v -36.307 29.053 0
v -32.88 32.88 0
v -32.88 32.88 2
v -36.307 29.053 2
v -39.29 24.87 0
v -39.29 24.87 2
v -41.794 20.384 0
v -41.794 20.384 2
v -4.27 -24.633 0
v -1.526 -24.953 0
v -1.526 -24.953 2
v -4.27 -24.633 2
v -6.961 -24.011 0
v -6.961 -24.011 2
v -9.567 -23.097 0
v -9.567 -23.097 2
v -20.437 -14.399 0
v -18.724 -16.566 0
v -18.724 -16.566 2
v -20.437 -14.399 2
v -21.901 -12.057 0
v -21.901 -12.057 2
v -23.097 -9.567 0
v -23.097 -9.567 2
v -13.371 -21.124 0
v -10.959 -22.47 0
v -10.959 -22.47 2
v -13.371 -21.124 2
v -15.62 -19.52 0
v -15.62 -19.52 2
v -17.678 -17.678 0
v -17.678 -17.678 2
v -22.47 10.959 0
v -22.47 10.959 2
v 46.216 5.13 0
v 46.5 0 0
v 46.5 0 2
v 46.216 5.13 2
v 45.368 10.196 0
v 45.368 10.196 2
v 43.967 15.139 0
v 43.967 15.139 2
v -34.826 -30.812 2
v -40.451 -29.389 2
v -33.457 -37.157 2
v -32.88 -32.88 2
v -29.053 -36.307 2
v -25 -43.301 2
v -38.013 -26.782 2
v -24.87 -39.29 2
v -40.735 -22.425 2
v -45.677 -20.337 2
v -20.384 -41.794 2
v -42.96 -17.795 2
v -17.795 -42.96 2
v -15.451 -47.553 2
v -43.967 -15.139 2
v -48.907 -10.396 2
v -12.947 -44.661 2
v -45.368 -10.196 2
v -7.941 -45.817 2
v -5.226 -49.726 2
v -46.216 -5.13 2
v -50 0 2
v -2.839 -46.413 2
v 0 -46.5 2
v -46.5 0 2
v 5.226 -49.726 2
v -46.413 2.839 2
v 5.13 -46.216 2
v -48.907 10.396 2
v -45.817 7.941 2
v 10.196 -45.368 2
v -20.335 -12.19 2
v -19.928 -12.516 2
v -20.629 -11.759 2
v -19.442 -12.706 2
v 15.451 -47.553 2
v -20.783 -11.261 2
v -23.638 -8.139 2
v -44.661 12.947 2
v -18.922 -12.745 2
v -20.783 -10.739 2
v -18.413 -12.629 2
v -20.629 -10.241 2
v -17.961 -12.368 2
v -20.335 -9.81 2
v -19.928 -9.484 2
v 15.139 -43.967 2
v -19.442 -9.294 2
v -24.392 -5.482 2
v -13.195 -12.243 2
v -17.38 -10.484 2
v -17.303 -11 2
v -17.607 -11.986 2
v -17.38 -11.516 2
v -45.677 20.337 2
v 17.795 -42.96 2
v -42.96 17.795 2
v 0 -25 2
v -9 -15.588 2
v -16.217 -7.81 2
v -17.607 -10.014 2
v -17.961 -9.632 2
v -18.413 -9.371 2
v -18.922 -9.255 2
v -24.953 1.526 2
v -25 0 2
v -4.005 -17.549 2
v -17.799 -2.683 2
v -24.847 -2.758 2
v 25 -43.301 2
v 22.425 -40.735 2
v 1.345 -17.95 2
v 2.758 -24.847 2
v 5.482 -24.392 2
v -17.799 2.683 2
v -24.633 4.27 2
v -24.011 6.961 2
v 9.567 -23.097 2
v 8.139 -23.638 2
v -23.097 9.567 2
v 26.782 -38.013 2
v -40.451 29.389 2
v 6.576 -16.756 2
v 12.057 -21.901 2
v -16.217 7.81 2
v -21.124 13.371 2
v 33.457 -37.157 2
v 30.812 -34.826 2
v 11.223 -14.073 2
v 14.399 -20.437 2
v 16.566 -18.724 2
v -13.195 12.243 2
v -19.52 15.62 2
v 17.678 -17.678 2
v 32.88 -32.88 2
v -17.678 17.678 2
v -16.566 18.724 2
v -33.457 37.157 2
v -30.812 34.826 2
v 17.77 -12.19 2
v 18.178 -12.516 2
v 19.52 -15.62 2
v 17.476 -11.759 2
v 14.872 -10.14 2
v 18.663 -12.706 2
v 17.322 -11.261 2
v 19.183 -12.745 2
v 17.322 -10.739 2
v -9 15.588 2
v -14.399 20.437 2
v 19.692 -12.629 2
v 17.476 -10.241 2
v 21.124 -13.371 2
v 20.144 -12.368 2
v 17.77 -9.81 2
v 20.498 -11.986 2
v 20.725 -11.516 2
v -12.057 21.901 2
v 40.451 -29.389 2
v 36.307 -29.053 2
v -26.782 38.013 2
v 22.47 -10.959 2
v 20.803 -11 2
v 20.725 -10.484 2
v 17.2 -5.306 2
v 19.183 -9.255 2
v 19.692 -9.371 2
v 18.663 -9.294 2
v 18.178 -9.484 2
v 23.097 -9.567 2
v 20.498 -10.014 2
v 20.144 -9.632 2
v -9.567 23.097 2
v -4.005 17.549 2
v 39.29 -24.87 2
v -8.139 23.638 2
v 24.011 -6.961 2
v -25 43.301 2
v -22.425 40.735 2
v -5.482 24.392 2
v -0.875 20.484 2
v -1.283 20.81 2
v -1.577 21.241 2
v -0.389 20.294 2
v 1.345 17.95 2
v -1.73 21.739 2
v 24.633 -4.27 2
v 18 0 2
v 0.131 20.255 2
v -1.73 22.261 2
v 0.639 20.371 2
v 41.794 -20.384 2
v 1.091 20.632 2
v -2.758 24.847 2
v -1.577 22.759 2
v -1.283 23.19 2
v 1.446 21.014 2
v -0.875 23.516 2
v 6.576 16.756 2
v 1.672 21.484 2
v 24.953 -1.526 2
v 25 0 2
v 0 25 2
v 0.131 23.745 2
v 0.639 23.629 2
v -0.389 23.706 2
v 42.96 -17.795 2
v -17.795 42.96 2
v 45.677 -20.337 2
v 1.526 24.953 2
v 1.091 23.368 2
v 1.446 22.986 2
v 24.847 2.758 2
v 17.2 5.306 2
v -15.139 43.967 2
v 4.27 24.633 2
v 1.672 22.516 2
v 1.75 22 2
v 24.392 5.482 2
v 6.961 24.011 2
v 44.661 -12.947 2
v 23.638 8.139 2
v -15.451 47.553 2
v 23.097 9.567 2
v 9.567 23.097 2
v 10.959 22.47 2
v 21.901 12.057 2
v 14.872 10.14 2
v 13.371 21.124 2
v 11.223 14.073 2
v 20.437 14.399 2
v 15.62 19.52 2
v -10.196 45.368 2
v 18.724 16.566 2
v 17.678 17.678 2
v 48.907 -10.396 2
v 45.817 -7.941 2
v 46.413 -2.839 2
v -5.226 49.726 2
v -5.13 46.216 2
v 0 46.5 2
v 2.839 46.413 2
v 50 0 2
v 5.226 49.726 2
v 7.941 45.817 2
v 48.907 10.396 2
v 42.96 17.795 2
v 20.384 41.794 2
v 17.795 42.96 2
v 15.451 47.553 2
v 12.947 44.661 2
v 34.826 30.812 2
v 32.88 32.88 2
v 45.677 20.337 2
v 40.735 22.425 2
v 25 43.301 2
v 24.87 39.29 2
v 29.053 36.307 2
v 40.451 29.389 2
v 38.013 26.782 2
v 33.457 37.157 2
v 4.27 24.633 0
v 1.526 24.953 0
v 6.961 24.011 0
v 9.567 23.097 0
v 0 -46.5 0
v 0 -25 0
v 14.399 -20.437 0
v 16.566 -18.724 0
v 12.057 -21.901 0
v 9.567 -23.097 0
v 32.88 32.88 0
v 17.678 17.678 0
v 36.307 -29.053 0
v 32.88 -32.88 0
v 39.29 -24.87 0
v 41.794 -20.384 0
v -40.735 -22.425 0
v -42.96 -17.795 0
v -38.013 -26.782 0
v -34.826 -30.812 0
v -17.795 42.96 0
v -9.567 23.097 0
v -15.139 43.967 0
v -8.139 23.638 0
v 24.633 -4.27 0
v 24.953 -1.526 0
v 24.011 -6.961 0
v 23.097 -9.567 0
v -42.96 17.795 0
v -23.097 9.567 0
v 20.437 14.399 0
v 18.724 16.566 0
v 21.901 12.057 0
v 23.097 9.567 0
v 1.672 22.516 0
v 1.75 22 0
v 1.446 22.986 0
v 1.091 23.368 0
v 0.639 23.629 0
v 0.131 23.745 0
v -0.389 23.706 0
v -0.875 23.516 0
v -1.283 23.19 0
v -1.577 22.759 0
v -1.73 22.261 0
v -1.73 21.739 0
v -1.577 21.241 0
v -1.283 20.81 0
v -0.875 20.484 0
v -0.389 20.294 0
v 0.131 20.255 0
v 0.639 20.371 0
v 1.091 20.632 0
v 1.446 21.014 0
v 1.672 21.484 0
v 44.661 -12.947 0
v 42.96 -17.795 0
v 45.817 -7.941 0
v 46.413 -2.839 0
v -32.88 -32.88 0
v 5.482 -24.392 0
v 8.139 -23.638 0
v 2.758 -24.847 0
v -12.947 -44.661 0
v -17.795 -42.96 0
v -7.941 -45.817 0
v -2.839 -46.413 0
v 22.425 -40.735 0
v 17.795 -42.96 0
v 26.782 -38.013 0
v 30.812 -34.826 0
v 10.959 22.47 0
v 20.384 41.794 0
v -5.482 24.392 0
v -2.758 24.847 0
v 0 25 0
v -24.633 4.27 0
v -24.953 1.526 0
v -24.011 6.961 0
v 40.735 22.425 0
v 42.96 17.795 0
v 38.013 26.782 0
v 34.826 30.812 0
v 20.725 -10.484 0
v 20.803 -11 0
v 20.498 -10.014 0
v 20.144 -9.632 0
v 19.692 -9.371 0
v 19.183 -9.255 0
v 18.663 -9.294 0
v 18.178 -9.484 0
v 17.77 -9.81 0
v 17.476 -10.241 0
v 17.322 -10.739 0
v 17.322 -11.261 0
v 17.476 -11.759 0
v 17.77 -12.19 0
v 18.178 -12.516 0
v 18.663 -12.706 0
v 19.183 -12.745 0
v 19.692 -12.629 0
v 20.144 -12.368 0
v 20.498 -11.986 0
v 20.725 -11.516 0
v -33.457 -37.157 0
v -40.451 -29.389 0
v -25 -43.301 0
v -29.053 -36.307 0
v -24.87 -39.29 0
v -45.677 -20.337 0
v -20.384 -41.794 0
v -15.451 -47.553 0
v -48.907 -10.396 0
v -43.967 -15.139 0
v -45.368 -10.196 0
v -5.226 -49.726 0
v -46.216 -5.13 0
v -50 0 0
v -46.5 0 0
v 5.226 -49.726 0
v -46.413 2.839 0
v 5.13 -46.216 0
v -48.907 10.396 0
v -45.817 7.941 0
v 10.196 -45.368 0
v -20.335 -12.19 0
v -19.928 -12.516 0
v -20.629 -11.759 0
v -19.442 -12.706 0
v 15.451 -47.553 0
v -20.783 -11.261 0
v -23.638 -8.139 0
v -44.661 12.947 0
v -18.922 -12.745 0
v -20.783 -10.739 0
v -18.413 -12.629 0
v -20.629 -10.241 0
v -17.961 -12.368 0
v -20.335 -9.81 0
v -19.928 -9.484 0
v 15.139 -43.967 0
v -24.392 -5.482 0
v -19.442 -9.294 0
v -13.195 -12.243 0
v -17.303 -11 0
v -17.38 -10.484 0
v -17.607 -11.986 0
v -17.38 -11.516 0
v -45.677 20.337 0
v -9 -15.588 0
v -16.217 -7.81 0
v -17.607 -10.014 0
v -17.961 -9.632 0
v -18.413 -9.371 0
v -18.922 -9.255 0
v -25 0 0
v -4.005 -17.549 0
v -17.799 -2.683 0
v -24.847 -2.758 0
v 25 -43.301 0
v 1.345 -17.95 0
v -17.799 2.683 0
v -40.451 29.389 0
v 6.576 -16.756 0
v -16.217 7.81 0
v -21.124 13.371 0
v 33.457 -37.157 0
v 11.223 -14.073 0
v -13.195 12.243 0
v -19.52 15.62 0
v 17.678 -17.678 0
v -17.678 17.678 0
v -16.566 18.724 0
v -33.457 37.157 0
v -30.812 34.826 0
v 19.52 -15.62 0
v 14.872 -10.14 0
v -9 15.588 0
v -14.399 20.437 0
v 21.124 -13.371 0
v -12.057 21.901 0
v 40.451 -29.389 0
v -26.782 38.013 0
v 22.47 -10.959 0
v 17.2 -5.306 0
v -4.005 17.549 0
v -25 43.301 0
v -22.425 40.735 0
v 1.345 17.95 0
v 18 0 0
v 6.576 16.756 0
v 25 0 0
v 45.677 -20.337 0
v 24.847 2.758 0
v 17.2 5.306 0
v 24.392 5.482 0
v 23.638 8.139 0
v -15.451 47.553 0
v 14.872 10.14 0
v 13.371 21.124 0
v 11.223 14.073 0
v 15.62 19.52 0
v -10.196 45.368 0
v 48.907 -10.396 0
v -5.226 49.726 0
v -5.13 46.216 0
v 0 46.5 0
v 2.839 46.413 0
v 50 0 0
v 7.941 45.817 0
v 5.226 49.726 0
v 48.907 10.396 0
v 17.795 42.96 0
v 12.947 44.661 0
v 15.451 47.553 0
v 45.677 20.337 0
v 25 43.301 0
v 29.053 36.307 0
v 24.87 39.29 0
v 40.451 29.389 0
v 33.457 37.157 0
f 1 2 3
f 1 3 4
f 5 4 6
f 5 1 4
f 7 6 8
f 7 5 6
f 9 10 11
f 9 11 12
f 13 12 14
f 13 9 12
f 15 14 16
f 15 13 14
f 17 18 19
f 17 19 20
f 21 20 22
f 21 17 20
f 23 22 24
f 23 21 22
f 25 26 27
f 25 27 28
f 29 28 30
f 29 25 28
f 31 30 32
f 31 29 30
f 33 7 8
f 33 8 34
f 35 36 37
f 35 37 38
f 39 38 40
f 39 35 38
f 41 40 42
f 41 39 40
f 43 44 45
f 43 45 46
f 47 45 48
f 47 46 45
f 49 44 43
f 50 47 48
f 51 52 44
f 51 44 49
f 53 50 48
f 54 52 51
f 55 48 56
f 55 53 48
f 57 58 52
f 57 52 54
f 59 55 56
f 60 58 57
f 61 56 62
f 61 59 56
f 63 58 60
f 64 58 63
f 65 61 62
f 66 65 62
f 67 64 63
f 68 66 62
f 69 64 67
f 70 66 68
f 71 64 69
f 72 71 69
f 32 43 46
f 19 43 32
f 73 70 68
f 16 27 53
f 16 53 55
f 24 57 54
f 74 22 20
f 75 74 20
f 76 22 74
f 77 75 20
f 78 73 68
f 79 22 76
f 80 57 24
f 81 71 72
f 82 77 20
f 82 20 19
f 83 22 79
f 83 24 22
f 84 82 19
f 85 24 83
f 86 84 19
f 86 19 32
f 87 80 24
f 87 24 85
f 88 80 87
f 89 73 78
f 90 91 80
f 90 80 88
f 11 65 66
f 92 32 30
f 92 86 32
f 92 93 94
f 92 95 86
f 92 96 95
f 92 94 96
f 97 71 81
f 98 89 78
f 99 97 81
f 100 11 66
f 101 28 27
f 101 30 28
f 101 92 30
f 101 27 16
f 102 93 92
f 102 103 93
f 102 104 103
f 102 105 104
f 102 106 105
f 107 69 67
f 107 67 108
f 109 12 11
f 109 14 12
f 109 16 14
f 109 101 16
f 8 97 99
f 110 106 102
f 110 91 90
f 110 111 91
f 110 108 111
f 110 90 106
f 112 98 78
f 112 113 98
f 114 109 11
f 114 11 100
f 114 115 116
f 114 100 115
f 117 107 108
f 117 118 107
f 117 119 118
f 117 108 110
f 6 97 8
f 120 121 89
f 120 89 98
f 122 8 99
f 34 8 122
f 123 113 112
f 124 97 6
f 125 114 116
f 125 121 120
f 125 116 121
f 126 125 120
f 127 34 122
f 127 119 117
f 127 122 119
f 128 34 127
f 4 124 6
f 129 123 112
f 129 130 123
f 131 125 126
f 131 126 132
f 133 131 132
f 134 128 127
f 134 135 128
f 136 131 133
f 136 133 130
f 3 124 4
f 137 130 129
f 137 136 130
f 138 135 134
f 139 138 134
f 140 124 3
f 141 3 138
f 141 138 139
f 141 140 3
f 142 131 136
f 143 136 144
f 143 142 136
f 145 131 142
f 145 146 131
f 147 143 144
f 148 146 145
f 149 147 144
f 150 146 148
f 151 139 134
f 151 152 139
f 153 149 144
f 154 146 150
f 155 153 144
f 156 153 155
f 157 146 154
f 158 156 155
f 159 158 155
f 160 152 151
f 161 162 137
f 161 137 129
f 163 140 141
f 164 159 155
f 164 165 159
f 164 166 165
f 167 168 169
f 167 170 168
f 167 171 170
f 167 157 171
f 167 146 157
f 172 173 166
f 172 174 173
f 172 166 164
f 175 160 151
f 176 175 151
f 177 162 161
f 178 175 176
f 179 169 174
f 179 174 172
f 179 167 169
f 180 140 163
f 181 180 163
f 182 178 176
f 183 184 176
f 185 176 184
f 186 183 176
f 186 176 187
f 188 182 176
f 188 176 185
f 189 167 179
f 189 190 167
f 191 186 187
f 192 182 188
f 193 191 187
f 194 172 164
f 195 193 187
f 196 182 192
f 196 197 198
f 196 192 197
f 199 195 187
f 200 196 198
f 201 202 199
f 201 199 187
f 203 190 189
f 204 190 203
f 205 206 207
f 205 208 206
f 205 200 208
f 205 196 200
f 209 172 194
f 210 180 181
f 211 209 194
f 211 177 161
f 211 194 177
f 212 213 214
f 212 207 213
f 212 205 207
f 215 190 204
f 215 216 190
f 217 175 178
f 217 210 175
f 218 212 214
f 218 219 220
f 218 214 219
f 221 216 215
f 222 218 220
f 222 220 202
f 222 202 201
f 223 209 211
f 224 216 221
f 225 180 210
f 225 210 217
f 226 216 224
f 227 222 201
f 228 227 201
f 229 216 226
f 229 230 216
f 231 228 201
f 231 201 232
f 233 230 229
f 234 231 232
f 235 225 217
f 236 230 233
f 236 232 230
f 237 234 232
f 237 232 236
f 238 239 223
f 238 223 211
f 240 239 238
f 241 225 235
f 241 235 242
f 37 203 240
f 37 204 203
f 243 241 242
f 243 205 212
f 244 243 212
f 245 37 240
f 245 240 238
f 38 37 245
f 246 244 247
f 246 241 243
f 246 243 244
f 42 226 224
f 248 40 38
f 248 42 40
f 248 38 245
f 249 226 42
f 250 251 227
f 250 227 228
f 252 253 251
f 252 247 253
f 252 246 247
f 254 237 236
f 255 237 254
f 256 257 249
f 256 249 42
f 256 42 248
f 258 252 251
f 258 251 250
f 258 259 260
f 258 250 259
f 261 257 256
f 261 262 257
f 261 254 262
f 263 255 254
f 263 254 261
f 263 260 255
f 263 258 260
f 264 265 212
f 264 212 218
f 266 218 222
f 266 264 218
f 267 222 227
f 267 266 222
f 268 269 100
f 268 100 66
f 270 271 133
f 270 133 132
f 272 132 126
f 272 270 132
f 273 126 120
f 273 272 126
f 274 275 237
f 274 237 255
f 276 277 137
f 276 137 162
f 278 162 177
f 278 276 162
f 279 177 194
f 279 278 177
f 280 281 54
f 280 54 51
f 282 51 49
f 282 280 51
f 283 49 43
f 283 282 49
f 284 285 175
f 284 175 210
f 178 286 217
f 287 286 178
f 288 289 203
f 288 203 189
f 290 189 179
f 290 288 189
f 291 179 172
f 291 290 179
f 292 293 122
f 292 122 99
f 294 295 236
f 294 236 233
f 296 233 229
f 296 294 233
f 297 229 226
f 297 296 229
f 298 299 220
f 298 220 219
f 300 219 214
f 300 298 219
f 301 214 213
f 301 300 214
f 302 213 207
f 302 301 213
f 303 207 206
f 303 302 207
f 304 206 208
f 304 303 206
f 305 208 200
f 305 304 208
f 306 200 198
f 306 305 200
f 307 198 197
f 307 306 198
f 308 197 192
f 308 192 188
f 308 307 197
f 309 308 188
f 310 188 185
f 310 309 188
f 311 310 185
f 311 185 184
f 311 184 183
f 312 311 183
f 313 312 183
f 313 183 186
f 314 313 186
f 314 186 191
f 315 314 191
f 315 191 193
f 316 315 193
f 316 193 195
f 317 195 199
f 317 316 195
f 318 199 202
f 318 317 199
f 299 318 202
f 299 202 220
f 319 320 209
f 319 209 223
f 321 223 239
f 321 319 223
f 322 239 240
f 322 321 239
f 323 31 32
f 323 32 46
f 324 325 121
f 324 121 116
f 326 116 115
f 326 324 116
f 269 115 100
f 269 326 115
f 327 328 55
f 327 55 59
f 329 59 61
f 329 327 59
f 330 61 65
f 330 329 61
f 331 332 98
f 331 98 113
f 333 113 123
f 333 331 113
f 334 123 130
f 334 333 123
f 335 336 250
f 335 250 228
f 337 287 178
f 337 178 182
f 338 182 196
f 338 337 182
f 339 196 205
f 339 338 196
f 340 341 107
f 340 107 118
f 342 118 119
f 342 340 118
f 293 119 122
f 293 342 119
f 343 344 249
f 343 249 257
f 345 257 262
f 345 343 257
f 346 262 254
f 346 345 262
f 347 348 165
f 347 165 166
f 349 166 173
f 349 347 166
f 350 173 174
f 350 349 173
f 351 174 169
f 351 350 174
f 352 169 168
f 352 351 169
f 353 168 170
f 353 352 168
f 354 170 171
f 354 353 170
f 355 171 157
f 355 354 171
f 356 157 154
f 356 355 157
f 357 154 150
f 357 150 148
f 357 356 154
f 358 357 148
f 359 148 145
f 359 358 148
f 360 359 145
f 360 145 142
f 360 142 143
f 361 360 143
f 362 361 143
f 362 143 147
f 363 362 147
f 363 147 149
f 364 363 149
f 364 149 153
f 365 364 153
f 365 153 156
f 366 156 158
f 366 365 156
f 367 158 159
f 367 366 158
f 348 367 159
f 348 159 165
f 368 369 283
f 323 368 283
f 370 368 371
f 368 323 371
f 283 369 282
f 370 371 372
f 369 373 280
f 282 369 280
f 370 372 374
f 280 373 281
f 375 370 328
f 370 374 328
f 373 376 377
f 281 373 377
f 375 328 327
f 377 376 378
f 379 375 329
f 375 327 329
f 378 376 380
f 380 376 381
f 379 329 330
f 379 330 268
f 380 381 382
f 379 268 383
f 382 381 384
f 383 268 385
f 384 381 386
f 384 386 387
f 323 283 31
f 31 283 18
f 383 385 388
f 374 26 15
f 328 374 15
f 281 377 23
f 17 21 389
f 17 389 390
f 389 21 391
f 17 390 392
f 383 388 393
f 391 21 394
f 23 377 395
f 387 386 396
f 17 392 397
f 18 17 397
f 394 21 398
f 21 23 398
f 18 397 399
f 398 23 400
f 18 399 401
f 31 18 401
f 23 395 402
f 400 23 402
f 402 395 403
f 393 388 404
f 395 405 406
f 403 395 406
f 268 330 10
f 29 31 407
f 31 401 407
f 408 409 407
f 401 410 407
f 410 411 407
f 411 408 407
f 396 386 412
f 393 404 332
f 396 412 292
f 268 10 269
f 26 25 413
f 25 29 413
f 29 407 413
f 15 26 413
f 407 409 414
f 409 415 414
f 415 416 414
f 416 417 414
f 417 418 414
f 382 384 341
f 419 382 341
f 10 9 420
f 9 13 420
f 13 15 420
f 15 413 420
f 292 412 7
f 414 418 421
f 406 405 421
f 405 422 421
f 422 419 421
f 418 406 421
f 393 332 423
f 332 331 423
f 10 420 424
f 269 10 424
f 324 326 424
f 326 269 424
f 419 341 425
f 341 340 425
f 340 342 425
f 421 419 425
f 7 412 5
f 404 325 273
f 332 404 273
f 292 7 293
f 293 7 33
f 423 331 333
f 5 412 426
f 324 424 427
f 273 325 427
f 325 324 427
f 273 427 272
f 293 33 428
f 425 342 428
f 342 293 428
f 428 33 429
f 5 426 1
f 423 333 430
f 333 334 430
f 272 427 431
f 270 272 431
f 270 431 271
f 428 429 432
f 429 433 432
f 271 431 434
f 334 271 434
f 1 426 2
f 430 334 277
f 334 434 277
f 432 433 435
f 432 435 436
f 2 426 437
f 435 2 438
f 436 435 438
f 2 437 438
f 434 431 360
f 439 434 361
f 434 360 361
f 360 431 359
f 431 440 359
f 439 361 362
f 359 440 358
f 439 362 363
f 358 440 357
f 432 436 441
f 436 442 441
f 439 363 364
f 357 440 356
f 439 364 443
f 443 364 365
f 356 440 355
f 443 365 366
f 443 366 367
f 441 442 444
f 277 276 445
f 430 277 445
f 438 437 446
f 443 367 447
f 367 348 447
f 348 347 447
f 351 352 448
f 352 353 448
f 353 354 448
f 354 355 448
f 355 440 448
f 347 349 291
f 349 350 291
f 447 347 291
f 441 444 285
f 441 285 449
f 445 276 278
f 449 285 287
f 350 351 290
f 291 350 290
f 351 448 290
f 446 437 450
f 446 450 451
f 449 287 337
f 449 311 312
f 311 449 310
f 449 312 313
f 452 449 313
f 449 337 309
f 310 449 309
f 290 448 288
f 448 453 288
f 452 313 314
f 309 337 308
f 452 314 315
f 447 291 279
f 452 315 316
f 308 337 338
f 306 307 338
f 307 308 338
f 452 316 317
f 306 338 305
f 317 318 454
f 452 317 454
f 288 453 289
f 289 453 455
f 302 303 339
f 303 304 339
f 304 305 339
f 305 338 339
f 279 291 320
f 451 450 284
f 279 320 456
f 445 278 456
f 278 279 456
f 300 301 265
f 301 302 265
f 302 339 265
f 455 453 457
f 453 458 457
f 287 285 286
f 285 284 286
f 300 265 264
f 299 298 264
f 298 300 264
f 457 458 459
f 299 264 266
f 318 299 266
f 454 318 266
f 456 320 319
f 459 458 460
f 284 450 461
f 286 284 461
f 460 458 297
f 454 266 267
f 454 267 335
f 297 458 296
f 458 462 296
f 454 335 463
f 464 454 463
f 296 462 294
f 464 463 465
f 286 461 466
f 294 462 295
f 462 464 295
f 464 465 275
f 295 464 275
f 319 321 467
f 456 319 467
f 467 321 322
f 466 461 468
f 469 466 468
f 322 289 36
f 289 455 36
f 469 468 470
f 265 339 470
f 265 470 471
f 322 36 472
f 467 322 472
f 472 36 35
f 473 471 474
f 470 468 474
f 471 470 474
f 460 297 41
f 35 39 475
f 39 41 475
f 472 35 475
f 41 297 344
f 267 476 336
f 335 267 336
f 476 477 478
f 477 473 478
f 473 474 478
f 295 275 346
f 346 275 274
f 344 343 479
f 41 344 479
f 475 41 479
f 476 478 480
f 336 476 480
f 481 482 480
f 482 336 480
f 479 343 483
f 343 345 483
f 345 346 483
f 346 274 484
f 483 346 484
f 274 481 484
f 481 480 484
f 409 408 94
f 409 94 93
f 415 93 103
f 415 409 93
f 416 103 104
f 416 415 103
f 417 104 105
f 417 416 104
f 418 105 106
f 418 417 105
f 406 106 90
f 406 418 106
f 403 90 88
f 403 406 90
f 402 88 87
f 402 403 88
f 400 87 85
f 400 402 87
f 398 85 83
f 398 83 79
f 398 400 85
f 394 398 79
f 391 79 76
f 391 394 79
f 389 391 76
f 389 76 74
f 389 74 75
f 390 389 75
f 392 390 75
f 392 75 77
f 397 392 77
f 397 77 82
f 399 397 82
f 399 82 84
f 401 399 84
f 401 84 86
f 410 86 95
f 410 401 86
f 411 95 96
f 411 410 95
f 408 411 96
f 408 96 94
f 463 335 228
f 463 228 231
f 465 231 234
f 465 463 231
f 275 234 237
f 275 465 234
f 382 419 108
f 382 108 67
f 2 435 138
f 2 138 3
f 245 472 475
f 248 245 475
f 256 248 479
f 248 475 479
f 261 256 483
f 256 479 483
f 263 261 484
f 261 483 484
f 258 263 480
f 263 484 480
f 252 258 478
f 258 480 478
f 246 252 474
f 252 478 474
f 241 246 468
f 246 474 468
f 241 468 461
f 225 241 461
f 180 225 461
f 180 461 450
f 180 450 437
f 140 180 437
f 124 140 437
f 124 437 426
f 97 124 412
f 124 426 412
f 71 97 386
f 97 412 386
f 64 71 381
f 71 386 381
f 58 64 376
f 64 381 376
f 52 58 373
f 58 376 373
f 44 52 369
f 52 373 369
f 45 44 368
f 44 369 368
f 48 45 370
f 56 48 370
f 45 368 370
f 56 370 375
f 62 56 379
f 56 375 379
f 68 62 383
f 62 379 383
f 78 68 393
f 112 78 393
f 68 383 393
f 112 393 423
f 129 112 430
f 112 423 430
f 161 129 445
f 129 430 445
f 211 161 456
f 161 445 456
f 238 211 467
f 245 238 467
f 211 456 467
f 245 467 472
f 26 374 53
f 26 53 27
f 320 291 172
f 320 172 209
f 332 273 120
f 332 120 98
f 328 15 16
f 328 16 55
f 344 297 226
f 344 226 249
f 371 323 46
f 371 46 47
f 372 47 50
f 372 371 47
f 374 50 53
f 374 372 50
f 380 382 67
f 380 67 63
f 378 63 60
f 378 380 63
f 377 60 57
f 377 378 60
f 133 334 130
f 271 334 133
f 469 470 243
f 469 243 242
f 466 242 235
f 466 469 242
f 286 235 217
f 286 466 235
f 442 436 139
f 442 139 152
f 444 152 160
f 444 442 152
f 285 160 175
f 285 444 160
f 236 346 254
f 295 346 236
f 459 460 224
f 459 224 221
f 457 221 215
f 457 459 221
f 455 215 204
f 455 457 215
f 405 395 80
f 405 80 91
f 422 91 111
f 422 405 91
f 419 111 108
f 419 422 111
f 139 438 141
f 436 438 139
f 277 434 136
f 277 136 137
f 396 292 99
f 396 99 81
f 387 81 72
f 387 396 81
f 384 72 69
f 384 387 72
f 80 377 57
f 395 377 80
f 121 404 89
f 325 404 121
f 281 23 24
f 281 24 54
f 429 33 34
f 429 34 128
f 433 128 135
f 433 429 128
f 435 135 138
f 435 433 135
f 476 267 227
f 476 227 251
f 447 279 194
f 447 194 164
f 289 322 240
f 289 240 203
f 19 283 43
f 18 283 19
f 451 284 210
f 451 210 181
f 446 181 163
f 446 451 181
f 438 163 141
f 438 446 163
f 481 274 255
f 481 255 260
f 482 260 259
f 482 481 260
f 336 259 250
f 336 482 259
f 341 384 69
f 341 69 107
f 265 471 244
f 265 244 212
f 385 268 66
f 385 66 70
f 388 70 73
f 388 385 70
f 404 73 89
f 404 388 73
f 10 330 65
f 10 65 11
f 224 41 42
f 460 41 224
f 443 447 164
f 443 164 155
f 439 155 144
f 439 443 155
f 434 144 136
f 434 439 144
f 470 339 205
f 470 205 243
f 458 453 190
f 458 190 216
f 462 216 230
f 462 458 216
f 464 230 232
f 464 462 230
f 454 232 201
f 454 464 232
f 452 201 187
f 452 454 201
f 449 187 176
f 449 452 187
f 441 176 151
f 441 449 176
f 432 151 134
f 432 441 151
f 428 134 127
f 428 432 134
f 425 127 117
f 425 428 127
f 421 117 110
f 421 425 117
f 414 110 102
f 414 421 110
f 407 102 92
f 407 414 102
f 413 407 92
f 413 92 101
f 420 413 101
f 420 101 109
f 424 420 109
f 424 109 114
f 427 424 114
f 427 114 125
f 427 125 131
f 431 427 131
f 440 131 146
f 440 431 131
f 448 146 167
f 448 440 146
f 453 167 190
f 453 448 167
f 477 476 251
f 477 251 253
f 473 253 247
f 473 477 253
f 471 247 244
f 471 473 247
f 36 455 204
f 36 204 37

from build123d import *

# Parameters (mm, degrees)
SKETCH1_R           = 50
SKETCH1_R_2         = 18
SKETCH1_R_3         = 1.75
BOSS_EXTRUDE1_DEPTH = 2


with BuildPart() as part:
    # Sketch1 → Boss-Extrude1 (new body)
    with BuildSketch(Plane.XY):
        Circle(SKETCH1_R)
        Circle(SKETCH1_R_2, mode=Mode.SUBTRACT)
        with Locations((0, 22)):
            Circle(SKETCH1_R_3, mode=Mode.SUBTRACT)
        with Locations((19.052558883, -11)):
            Circle(SKETCH1_R_3, mode=Mode.SUBTRACT)
        with Locations((-19.052558883, -11)):
            Circle(SKETCH1_R_3, mode=Mode.SUBTRACT)
        with BuildLine():
            Line((25, 0), (46.5, 0))
            ThreePointArc((46.5, 0), (45.862280471, 7.674713673), (43.966613765, 15.138919182))
            Line((43.966613765, 15.138919182), (23.63796439, 8.139203861))
            ThreePointArc((23.63796439, 8.139203861), (24.657140038, 4.126190147), (25, 0))
        make_face(mode=Mode.SUBTRACT)
        with BuildLine():
            Line((23.096988313, -9.567085809), (42.960398262, -17.794779605))
            ThreePointArc((42.960398262, -17.794779605), (45.308208013, -10.460224027), (46.413268127, -2.838757088))
            Line((46.413268127, -2.838757088), (24.953369961, -1.526213488))
            ThreePointArc((24.953369961, -1.526213488), (24.35925162, -5.623776359), (23.096988313, -9.567085809))
        make_face(mode=Mode.SUBTRACT)
        with BuildLine():
            Line((17.67766953, -17.67766953), (32.880465325, -32.880465325))
            ThreePointArc((32.880465325, -32.880465325), (37.856371604, -27.002687441), (41.793923153, -20.384258326))
            Line((41.793923153, -20.384258326), (22.469851157, -10.95927867))
            ThreePointArc((22.469851157, -10.95927867), (20.352887959, -14.517573893), (17.67766953, -17.67766953))
        make_face(mode=Mode.SUBTRACT)
        with BuildLine():
            Line((9.567085809, -23.096988313), (17.794779605, -42.960398262))
            ThreePointArc((17.794779605, -42.960398262), (24.641245787, -39.434236471), (30.811832242, -34.826441017))
            Line((30.811832242, -34.826441017), (16.565501205, -18.72389302))
            ThreePointArc((16.565501205, -18.72389302), (13.247981606, -21.201202404), (9.567085809, -23.096988313))
        make_face(mode=Mode.SUBTRACT)
        with BuildLine():
            Line((0, -25), (0, -46.5))
            ThreePointArc((0, -46.5), (7.674713673, -45.862280471), (15.138919182, -43.966613765))
            Line((15.138919182, -43.966613765), (8.139203861, -23.63796439))
            ThreePointArc((8.139203861, -23.63796439), (4.126190147, -24.657140038), (0, -25))
        make_face(mode=Mode.SUBTRACT)
        with BuildLine():
            Line((-9.567085809, -23.096988313), (-17.794779605, -42.960398262))
            ThreePointArc((-17.794779605, -42.960398262), (-10.460224027, -45.308208013), (-2.838757088, -46.413268127))
            Line((-2.838757088, -46.413268127), (-1.526213488, -24.953369961))
            ThreePointArc((-1.526213488, -24.953369961), (-5.623776359, -24.35925162), (-9.567085809, -23.096988313))
        make_face(mode=Mode.SUBTRACT)
        with BuildLine():
            Line((-17.67766953, -17.67766953), (-32.880465325, -32.880465325))
            ThreePointArc((-32.880465325, -32.880465325), (-27.002687441, -37.856371604), (-20.384258326, -41.793923153))
            Line((-20.384258326, -41.793923153), (-10.95927867, -22.469851157))
            ThreePointArc((-10.95927867, -22.469851157), (-14.517573893, -20.352887959), (-17.67766953, -17.67766953))
        make_face(mode=Mode.SUBTRACT)
        with BuildLine():
            Line((-23.096988313, -9.567085809), (-42.960398262, -17.794779605))
            ThreePointArc((-42.960398262, -17.794779605), (-39.434236471, -24.641245787), (-34.826441017, -30.811832242))
            Line((-34.826441017, -30.811832242), (-18.72389302, -16.565501205))
            ThreePointArc((-18.72389302, -16.565501205), (-21.201202404, -13.247981606), (-23.096988313, -9.567085809))
        make_face(mode=Mode.SUBTRACT)
        with BuildLine():
            Line((-25, 0), (-46.5, 0))
            ThreePointArc((-46.5, 0), (-45.862280471, -7.674713673), (-43.966613765, -15.138919182))
            Line((-43.966613765, -15.138919182), (-23.63796439, -8.139203861))
            ThreePointArc((-23.63796439, -8.139203861), (-24.657140038, -4.126190147), (-25, 0))
        make_face(mode=Mode.SUBTRACT)
        with BuildLine():
            Line((-23.096988313, 9.567085809), (-42.960398262, 17.794779605))
            ThreePointArc((-42.960398262, 17.794779605), (-45.308208013, 10.460224027), (-46.413268127, 2.838757088))
            Line((-46.413268127, 2.838757088), (-24.953369961, 1.526213488))
            ThreePointArc((-24.953369961, 1.526213488), (-24.35925162, 5.623776359), (-23.096988313, 9.567085809))
        make_face(mode=Mode.SUBTRACT)
        with BuildLine():
            Line((-17.67766953, 17.67766953), (-32.880465325, 32.880465325))
            ThreePointArc((-32.880465325, 32.880465325), (-37.856371604, 27.002687441), (-41.793923153, 20.384258326))
            Line((-41.793923153, 20.384258326), (-22.469851157, 10.95927867))
            ThreePointArc((-22.469851157, 10.95927867), (-20.352887959, 14.517573893), (-17.67766953, 17.67766953))
        make_face(mode=Mode.SUBTRACT)
        with BuildLine():
            Line((-9.567085809, 23.096988313), (-17.794779605, 42.960398262))
            ThreePointArc((-17.794779605, 42.960398262), (-24.641245787, 39.434236471), (-30.811832242, 34.826441017))
            Line((-30.811832242, 34.826441017), (-16.565501205, 18.72389302))
            ThreePointArc((-16.565501205, 18.72389302), (-13.247981606, 21.201202404), (-9.567085809, 23.096988313))
        make_face(mode=Mode.SUBTRACT)
        with BuildLine():
            Line((0, 25), (0, 46.5))
            ThreePointArc((0, 46.5), (-7.674713673, 45.862280471), (-15.138919182, 43.966613765))
            Line((-15.138919182, 43.966613765), (-8.139203861, 23.63796439))
            ThreePointArc((-8.139203861, 23.63796439), (-4.126190147, 24.657140038), (0, 25))
        make_face(mode=Mode.SUBTRACT)
        with BuildLine():
            Line((9.567085809, 23.096988313), (17.794779605, 42.960398262))
            ThreePointArc((17.794779605, 42.960398262), (10.460224027, 45.308208013), (2.838757088, 46.413268127))
            Line((2.838757088, 46.413268127), (1.526213488, 24.953369961))
            ThreePointArc((1.526213488, 24.953369961), (5.623776359, 24.35925162), (9.567085809, 23.096988313))
        make_face(mode=Mode.SUBTRACT)
        with BuildLine():
            Line((17.67766953, 17.67766953), (32.880465325, 32.880465325))
            ThreePointArc((32.880465325, 32.880465325), (27.002687441, 37.856371604), (20.384258326, 41.793923153))
            Line((20.384258326, 41.793923153), (10.95927867, 22.469851157))
            ThreePointArc((10.95927867, 22.469851157), (14.517573893, 20.352887959), (17.67766953, 17.67766953))
        make_face(mode=Mode.SUBTRACT)
        with BuildLine():
            Line((23.096988313, 9.567085809), (42.960398262, 17.794779605))
            ThreePointArc((42.960398262, 17.794779605), (39.434236471, 24.641245787), (34.826441017, 30.811832242))
            Line((34.826441017, 30.811832242), (18.72389302, 16.565501205))
            ThreePointArc((18.72389302, 16.565501205), (21.201202404, 13.247981606), (23.096988313, 9.567085809))
        make_face(mode=Mode.SUBTRACT)
    extrude(amount=BOSS_EXTRUDE1_DEPTH)


solid = part.part
